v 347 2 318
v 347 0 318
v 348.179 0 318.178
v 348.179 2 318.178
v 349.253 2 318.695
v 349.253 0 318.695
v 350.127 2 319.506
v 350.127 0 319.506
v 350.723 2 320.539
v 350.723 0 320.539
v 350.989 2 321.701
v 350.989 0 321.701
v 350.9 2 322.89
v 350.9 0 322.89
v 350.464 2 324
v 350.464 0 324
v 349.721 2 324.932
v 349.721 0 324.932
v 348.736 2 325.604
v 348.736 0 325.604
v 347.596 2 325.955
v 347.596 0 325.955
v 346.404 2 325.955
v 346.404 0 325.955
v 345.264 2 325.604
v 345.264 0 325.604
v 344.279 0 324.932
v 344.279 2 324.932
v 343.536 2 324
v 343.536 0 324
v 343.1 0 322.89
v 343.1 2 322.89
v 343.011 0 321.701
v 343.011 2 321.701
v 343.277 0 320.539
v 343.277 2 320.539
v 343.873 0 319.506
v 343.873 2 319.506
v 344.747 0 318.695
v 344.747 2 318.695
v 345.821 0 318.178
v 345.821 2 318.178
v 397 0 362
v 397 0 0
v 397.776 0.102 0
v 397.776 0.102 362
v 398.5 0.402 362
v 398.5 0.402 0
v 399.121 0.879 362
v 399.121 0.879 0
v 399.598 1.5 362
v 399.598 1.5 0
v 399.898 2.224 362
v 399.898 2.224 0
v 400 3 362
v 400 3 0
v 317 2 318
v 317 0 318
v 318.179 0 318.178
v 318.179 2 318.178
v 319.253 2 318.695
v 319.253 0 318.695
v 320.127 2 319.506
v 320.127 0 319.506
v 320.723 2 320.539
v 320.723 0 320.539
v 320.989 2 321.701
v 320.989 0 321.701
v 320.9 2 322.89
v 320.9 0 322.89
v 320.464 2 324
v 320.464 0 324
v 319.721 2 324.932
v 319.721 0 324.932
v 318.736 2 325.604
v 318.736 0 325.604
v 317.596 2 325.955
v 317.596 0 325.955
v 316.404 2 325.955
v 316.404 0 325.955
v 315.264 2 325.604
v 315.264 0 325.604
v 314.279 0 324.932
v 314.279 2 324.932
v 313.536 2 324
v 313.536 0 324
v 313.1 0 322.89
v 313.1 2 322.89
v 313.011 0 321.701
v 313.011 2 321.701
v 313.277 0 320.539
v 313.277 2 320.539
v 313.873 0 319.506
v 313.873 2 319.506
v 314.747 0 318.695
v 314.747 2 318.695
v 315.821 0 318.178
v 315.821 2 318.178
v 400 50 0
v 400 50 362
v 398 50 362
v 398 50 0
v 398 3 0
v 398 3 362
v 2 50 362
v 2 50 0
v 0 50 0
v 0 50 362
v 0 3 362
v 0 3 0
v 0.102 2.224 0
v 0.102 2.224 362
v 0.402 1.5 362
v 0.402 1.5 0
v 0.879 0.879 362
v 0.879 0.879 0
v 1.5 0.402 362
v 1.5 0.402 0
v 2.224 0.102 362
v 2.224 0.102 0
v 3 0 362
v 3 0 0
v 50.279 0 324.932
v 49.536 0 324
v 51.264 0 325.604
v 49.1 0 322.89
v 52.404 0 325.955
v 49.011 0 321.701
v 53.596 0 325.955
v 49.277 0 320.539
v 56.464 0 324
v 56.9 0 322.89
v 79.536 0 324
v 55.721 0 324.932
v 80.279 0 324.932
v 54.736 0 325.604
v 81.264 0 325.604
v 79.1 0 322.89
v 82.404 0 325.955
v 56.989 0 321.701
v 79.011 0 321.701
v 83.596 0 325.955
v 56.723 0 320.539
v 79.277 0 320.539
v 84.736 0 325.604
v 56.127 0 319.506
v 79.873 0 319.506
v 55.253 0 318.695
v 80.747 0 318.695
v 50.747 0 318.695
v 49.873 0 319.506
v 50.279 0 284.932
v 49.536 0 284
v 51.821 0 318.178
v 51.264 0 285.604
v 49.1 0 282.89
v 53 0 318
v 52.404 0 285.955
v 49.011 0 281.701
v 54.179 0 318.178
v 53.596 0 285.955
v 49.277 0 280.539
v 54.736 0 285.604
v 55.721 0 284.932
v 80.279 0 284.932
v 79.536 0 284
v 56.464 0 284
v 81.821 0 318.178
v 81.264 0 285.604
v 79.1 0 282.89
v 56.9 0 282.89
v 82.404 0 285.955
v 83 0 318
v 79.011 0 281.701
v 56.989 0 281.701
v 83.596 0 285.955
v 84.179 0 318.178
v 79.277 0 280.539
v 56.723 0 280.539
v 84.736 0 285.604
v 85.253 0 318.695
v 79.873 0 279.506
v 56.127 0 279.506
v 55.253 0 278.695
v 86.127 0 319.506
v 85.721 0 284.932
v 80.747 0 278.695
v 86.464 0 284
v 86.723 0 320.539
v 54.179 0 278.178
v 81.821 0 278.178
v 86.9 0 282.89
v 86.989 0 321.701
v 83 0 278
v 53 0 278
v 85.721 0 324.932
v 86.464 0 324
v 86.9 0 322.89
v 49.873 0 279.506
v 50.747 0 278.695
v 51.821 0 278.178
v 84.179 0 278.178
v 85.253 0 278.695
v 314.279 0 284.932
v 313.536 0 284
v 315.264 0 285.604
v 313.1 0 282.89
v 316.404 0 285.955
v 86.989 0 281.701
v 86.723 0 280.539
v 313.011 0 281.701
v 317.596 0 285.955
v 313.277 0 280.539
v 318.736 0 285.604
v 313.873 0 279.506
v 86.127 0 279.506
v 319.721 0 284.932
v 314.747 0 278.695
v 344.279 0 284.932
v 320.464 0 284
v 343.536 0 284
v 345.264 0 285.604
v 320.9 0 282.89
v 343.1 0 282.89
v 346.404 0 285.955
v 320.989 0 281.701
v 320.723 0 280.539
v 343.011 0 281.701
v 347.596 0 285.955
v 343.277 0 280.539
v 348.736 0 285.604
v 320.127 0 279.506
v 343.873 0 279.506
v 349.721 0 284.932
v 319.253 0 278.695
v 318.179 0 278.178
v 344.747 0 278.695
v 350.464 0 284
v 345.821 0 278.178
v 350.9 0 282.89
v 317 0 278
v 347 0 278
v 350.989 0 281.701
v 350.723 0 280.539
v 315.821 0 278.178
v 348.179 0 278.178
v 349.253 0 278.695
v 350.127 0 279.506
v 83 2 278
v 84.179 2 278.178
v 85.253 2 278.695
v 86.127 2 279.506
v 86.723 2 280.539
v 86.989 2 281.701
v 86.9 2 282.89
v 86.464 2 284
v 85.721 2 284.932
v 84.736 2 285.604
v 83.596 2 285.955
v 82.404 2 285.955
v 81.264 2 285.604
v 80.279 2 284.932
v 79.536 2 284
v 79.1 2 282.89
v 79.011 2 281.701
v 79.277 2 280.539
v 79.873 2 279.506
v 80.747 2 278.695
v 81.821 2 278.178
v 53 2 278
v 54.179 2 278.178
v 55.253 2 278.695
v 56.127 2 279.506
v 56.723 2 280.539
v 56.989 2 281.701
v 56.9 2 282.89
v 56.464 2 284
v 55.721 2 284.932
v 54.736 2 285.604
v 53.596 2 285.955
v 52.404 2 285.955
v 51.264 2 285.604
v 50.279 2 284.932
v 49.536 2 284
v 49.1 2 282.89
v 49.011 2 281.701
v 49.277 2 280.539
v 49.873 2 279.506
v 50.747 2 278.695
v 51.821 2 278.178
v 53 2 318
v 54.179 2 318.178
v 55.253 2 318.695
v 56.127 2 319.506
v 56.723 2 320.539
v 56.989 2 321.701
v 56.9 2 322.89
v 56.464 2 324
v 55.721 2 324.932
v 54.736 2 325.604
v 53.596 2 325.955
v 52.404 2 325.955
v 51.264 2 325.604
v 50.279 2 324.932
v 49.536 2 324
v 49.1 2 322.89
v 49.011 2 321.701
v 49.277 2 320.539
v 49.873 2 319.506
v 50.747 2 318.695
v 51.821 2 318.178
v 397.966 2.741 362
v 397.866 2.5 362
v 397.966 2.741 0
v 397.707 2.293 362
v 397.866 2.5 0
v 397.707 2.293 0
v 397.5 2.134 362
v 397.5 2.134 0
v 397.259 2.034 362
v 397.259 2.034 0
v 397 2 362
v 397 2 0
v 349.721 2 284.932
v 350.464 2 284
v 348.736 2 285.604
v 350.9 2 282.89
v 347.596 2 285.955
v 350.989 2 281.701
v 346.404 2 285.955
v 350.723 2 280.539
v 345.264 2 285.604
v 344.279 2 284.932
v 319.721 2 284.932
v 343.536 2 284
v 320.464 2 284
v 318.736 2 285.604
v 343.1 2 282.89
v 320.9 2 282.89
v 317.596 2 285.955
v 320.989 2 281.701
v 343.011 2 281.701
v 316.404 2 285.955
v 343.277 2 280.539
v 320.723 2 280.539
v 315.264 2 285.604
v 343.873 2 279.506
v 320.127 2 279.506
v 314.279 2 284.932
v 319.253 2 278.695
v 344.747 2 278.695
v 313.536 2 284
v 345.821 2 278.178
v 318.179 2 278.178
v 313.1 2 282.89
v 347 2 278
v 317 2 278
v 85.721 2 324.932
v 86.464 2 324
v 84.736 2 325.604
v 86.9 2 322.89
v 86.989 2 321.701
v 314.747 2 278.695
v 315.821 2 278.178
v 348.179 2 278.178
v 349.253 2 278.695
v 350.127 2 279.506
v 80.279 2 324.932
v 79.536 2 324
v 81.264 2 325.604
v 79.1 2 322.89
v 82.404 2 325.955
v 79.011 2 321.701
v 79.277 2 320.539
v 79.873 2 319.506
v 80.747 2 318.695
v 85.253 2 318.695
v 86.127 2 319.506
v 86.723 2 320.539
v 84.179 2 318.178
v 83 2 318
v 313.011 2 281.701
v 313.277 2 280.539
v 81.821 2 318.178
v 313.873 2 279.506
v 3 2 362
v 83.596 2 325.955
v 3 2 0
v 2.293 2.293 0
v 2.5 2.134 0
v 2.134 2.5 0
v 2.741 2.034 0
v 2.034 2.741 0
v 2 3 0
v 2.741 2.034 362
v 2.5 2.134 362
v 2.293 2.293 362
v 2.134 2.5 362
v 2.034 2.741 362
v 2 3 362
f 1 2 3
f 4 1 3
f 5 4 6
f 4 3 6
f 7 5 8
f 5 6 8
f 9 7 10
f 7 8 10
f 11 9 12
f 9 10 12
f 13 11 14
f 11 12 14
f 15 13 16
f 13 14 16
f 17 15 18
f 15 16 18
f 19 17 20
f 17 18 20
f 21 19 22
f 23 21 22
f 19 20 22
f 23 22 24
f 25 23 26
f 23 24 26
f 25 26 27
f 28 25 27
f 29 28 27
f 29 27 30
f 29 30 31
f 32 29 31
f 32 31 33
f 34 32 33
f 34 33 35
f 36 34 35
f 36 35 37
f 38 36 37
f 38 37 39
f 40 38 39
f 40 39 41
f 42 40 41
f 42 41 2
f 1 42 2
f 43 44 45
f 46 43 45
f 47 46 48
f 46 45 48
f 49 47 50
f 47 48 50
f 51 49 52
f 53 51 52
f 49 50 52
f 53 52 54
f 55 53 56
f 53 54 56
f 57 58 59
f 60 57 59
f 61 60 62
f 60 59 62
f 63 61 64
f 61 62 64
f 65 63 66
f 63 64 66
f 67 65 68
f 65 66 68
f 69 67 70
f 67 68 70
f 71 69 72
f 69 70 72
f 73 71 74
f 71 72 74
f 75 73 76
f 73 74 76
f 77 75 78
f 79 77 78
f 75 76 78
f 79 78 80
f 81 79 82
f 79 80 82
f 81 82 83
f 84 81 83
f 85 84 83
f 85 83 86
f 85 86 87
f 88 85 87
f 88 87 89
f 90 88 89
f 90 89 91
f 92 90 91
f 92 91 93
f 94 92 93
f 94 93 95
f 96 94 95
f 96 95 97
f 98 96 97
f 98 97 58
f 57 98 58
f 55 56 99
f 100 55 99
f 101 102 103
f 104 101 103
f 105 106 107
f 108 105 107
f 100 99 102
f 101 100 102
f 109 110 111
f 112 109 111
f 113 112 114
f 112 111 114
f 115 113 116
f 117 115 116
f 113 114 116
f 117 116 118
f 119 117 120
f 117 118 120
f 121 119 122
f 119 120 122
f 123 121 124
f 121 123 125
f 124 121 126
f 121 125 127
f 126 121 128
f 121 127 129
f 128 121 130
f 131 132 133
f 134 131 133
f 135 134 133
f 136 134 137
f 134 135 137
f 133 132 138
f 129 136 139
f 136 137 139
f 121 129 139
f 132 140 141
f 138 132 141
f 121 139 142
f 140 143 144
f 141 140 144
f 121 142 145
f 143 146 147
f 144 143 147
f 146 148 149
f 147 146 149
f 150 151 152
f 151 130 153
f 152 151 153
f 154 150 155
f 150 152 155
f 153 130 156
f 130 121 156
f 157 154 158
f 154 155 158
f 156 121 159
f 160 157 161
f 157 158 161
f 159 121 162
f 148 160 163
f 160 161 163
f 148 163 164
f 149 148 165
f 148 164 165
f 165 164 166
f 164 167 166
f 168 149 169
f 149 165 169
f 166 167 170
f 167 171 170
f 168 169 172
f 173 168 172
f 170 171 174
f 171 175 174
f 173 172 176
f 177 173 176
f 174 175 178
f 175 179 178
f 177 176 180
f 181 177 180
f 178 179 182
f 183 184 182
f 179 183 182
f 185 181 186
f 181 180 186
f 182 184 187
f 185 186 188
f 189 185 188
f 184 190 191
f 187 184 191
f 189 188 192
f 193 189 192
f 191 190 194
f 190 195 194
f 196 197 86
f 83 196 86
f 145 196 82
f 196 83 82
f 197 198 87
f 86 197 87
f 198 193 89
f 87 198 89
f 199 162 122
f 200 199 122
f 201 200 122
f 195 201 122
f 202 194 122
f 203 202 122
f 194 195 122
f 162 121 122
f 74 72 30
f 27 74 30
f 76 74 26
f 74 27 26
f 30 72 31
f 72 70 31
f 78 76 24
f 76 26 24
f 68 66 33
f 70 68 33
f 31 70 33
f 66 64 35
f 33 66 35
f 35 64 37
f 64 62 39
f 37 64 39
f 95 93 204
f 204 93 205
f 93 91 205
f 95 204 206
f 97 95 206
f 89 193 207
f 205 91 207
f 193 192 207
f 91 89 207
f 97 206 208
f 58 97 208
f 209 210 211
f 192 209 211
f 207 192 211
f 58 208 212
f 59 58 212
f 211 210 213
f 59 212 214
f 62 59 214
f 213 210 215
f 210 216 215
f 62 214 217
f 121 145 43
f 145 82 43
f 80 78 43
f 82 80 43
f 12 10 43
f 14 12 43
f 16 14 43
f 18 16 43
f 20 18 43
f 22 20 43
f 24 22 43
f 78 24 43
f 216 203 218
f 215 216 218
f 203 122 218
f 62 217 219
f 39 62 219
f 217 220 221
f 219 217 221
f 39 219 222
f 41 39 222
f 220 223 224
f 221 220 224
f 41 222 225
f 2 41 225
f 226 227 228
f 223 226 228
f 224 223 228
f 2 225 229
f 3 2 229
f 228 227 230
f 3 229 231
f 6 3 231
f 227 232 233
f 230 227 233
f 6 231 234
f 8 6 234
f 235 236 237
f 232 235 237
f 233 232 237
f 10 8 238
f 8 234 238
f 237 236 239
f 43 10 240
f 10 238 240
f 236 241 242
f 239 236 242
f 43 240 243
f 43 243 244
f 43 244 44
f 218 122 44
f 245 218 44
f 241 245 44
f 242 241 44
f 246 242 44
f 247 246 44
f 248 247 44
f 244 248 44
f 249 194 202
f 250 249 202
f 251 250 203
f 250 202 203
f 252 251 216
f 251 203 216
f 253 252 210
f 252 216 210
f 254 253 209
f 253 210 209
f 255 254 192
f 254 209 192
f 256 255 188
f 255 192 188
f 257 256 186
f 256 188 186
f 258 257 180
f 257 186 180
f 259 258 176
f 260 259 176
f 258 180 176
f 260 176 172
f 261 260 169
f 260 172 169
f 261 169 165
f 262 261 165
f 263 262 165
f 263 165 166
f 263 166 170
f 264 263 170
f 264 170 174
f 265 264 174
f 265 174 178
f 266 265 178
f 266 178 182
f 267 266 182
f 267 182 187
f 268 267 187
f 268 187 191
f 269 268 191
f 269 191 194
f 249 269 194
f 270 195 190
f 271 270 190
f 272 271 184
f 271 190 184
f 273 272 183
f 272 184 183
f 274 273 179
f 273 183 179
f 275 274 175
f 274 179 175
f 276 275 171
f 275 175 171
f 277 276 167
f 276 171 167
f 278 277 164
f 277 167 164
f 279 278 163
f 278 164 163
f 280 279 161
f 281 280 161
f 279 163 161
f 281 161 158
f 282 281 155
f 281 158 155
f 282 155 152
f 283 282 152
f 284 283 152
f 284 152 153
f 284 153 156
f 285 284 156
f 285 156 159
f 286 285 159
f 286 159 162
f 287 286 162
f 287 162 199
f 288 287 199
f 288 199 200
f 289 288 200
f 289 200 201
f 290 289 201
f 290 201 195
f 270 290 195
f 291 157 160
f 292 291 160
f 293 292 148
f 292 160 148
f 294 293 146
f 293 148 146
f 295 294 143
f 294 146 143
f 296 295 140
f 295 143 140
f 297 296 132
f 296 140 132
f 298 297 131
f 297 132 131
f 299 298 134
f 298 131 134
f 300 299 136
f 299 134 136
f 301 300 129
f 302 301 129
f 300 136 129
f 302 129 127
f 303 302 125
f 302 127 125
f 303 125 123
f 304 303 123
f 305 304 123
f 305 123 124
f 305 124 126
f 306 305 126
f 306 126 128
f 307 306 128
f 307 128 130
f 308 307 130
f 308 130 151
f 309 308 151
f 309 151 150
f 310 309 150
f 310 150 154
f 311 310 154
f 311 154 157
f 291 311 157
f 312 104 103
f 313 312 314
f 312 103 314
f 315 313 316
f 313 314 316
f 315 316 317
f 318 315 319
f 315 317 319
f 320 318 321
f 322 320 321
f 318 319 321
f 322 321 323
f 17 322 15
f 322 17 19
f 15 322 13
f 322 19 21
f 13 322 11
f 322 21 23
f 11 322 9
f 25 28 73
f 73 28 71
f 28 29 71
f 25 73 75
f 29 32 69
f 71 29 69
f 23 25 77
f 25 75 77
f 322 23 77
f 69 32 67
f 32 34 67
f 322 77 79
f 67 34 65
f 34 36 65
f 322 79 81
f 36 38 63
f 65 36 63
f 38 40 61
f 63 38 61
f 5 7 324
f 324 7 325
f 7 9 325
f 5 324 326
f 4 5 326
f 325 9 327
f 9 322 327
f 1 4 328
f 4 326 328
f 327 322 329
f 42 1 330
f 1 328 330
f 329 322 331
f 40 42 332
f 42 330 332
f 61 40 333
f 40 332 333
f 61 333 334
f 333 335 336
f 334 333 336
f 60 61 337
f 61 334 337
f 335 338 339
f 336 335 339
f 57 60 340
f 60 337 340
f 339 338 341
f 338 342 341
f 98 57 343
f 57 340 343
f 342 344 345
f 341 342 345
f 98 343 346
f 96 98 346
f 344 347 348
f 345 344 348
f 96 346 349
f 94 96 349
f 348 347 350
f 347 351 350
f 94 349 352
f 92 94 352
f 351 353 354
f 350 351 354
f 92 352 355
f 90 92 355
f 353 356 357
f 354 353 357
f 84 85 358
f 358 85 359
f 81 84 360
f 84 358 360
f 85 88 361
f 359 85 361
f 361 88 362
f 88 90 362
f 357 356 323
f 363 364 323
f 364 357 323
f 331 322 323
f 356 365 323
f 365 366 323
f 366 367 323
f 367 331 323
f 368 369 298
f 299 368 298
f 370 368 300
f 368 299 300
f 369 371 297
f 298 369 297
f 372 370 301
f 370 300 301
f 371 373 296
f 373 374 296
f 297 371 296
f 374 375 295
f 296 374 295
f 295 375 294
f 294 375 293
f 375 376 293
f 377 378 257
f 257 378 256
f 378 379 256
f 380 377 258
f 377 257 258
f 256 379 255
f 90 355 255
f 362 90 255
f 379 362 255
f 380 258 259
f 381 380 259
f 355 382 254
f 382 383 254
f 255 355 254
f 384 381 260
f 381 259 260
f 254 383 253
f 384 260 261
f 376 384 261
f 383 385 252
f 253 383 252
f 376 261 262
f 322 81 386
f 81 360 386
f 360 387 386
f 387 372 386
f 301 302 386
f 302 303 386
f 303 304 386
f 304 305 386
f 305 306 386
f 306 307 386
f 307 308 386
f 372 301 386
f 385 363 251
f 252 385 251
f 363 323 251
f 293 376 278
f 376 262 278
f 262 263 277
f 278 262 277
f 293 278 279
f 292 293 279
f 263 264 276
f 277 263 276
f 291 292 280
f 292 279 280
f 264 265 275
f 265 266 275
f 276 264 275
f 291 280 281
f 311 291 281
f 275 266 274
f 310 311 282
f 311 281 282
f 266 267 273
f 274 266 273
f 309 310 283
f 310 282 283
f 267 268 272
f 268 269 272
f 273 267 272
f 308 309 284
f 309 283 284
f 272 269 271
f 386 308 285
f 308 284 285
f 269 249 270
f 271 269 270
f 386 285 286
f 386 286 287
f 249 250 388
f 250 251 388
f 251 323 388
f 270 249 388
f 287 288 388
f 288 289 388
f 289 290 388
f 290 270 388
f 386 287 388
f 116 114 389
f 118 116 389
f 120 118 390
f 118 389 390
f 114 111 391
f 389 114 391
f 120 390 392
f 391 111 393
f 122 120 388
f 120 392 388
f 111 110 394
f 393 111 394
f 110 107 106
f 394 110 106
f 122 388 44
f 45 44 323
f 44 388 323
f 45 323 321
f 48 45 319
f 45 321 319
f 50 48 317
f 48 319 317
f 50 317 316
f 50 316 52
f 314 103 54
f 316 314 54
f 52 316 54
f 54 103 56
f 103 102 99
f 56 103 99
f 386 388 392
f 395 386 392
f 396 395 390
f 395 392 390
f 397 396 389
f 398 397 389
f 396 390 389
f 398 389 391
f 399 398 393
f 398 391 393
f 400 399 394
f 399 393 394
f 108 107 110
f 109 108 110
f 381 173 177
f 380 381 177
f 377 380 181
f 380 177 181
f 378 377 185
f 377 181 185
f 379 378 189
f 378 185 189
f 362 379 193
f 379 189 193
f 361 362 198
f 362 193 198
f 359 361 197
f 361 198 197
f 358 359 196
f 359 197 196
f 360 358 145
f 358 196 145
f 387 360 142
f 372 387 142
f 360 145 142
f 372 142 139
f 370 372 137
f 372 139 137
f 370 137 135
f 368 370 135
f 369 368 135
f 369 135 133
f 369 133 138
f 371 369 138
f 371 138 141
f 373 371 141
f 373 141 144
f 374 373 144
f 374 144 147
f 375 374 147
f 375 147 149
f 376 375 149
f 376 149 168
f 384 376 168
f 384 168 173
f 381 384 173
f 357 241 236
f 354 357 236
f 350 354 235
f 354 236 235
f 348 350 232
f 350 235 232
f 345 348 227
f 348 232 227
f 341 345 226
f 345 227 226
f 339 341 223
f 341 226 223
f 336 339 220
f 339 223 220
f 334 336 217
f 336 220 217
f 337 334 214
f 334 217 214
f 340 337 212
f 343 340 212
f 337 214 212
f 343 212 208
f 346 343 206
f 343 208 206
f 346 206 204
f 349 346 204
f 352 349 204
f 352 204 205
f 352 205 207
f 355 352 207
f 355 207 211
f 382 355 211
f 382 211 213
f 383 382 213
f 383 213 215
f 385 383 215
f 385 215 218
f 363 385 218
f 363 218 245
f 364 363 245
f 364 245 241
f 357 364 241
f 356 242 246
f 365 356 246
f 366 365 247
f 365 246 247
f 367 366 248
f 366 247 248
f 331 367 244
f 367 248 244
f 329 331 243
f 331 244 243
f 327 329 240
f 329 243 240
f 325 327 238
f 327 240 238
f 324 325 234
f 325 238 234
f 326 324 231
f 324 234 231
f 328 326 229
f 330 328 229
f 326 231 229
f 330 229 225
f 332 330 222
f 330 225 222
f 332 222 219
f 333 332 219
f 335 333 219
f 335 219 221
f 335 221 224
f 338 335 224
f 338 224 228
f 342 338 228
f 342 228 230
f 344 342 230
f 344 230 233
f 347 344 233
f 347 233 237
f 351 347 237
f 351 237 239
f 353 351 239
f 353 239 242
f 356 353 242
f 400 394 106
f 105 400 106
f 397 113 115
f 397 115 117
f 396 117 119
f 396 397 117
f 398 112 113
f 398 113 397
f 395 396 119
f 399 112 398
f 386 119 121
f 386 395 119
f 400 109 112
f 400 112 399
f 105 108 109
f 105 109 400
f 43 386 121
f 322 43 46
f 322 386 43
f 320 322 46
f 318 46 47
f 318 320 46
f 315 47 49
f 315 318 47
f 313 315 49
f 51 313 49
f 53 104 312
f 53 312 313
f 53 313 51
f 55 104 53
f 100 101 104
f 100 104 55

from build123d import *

# Parameters (mm, degrees)
BASE_FLANGE1_DEPTH = 362
SKETCH6_R          = 4
CUT_EXTRUDE1_DEPTH = 10


# Sheet-metal steps are written as plain solids
with BuildPart() as part:
    # Sketch1 → Base-Flange1 (new body)
    with BuildSketch(Plane.XY):
        with BuildLine():
            Line((0, 50), (0, 3))
            ThreePointArc((0, 3), (0.878679656, 0.878679656), (3, 0))
            Line((3, 0), (397, 0))
            ThreePointArc((397, 0), (399.121320344, 0.878679656), (400, 3))
            Line((400, 3), (400, 50))
            Line((400, 50), (398, 50))
            Line((398, 50), (398, 3))
            ThreePointArc((398, 3), (397.707106781, 2.292893219), (397, 2))
            Line((397, 2), (3, 2))
            ThreePointArc((3, 2), (2.292893219, 2.292893219), (2, 3))
            Line((2, 3), (2, 50))
            Line((2, 50), (0, 50))
        make_face()
    extrude(amount=BASE_FLANGE1_DEPTH)

    # Sketch6 → Cut-Extrude1 (cut)
    with BuildSketch(Plane.XZ):
        with Locations(Location((53, 322, 0), (0, 0, 270))):
            Circle(SKETCH6_R)
        with Locations(Location((83, 322, 0), (0, 0, 270))):
            Circle(SKETCH6_R)
        with Locations(Location((83, 282, 0), (0, 0, 270))):
            Circle(SKETCH6_R)
        with Locations(Location((53, 282, 0), (0, 0, 270))):
            Circle(SKETCH6_R)
        with Locations(Location((347, 282, 0), (0, 0, 270))):
            Circle(SKETCH6_R)
        with Locations(Location((317, 282, 0), (0, 0, 270))):
            Circle(SKETCH6_R)
        with Locations(Location((317, 322, 0), (0, 0, 270))):
            Circle(SKETCH6_R)
        with Locations(Location((347, 322, 0), (0, 0, 270))):
            Circle(SKETCH6_R)
    extrude(amount=-CUT_EXTRUDE1_DEPTH, mode=Mode.SUBTRACT)


solid = part.part
